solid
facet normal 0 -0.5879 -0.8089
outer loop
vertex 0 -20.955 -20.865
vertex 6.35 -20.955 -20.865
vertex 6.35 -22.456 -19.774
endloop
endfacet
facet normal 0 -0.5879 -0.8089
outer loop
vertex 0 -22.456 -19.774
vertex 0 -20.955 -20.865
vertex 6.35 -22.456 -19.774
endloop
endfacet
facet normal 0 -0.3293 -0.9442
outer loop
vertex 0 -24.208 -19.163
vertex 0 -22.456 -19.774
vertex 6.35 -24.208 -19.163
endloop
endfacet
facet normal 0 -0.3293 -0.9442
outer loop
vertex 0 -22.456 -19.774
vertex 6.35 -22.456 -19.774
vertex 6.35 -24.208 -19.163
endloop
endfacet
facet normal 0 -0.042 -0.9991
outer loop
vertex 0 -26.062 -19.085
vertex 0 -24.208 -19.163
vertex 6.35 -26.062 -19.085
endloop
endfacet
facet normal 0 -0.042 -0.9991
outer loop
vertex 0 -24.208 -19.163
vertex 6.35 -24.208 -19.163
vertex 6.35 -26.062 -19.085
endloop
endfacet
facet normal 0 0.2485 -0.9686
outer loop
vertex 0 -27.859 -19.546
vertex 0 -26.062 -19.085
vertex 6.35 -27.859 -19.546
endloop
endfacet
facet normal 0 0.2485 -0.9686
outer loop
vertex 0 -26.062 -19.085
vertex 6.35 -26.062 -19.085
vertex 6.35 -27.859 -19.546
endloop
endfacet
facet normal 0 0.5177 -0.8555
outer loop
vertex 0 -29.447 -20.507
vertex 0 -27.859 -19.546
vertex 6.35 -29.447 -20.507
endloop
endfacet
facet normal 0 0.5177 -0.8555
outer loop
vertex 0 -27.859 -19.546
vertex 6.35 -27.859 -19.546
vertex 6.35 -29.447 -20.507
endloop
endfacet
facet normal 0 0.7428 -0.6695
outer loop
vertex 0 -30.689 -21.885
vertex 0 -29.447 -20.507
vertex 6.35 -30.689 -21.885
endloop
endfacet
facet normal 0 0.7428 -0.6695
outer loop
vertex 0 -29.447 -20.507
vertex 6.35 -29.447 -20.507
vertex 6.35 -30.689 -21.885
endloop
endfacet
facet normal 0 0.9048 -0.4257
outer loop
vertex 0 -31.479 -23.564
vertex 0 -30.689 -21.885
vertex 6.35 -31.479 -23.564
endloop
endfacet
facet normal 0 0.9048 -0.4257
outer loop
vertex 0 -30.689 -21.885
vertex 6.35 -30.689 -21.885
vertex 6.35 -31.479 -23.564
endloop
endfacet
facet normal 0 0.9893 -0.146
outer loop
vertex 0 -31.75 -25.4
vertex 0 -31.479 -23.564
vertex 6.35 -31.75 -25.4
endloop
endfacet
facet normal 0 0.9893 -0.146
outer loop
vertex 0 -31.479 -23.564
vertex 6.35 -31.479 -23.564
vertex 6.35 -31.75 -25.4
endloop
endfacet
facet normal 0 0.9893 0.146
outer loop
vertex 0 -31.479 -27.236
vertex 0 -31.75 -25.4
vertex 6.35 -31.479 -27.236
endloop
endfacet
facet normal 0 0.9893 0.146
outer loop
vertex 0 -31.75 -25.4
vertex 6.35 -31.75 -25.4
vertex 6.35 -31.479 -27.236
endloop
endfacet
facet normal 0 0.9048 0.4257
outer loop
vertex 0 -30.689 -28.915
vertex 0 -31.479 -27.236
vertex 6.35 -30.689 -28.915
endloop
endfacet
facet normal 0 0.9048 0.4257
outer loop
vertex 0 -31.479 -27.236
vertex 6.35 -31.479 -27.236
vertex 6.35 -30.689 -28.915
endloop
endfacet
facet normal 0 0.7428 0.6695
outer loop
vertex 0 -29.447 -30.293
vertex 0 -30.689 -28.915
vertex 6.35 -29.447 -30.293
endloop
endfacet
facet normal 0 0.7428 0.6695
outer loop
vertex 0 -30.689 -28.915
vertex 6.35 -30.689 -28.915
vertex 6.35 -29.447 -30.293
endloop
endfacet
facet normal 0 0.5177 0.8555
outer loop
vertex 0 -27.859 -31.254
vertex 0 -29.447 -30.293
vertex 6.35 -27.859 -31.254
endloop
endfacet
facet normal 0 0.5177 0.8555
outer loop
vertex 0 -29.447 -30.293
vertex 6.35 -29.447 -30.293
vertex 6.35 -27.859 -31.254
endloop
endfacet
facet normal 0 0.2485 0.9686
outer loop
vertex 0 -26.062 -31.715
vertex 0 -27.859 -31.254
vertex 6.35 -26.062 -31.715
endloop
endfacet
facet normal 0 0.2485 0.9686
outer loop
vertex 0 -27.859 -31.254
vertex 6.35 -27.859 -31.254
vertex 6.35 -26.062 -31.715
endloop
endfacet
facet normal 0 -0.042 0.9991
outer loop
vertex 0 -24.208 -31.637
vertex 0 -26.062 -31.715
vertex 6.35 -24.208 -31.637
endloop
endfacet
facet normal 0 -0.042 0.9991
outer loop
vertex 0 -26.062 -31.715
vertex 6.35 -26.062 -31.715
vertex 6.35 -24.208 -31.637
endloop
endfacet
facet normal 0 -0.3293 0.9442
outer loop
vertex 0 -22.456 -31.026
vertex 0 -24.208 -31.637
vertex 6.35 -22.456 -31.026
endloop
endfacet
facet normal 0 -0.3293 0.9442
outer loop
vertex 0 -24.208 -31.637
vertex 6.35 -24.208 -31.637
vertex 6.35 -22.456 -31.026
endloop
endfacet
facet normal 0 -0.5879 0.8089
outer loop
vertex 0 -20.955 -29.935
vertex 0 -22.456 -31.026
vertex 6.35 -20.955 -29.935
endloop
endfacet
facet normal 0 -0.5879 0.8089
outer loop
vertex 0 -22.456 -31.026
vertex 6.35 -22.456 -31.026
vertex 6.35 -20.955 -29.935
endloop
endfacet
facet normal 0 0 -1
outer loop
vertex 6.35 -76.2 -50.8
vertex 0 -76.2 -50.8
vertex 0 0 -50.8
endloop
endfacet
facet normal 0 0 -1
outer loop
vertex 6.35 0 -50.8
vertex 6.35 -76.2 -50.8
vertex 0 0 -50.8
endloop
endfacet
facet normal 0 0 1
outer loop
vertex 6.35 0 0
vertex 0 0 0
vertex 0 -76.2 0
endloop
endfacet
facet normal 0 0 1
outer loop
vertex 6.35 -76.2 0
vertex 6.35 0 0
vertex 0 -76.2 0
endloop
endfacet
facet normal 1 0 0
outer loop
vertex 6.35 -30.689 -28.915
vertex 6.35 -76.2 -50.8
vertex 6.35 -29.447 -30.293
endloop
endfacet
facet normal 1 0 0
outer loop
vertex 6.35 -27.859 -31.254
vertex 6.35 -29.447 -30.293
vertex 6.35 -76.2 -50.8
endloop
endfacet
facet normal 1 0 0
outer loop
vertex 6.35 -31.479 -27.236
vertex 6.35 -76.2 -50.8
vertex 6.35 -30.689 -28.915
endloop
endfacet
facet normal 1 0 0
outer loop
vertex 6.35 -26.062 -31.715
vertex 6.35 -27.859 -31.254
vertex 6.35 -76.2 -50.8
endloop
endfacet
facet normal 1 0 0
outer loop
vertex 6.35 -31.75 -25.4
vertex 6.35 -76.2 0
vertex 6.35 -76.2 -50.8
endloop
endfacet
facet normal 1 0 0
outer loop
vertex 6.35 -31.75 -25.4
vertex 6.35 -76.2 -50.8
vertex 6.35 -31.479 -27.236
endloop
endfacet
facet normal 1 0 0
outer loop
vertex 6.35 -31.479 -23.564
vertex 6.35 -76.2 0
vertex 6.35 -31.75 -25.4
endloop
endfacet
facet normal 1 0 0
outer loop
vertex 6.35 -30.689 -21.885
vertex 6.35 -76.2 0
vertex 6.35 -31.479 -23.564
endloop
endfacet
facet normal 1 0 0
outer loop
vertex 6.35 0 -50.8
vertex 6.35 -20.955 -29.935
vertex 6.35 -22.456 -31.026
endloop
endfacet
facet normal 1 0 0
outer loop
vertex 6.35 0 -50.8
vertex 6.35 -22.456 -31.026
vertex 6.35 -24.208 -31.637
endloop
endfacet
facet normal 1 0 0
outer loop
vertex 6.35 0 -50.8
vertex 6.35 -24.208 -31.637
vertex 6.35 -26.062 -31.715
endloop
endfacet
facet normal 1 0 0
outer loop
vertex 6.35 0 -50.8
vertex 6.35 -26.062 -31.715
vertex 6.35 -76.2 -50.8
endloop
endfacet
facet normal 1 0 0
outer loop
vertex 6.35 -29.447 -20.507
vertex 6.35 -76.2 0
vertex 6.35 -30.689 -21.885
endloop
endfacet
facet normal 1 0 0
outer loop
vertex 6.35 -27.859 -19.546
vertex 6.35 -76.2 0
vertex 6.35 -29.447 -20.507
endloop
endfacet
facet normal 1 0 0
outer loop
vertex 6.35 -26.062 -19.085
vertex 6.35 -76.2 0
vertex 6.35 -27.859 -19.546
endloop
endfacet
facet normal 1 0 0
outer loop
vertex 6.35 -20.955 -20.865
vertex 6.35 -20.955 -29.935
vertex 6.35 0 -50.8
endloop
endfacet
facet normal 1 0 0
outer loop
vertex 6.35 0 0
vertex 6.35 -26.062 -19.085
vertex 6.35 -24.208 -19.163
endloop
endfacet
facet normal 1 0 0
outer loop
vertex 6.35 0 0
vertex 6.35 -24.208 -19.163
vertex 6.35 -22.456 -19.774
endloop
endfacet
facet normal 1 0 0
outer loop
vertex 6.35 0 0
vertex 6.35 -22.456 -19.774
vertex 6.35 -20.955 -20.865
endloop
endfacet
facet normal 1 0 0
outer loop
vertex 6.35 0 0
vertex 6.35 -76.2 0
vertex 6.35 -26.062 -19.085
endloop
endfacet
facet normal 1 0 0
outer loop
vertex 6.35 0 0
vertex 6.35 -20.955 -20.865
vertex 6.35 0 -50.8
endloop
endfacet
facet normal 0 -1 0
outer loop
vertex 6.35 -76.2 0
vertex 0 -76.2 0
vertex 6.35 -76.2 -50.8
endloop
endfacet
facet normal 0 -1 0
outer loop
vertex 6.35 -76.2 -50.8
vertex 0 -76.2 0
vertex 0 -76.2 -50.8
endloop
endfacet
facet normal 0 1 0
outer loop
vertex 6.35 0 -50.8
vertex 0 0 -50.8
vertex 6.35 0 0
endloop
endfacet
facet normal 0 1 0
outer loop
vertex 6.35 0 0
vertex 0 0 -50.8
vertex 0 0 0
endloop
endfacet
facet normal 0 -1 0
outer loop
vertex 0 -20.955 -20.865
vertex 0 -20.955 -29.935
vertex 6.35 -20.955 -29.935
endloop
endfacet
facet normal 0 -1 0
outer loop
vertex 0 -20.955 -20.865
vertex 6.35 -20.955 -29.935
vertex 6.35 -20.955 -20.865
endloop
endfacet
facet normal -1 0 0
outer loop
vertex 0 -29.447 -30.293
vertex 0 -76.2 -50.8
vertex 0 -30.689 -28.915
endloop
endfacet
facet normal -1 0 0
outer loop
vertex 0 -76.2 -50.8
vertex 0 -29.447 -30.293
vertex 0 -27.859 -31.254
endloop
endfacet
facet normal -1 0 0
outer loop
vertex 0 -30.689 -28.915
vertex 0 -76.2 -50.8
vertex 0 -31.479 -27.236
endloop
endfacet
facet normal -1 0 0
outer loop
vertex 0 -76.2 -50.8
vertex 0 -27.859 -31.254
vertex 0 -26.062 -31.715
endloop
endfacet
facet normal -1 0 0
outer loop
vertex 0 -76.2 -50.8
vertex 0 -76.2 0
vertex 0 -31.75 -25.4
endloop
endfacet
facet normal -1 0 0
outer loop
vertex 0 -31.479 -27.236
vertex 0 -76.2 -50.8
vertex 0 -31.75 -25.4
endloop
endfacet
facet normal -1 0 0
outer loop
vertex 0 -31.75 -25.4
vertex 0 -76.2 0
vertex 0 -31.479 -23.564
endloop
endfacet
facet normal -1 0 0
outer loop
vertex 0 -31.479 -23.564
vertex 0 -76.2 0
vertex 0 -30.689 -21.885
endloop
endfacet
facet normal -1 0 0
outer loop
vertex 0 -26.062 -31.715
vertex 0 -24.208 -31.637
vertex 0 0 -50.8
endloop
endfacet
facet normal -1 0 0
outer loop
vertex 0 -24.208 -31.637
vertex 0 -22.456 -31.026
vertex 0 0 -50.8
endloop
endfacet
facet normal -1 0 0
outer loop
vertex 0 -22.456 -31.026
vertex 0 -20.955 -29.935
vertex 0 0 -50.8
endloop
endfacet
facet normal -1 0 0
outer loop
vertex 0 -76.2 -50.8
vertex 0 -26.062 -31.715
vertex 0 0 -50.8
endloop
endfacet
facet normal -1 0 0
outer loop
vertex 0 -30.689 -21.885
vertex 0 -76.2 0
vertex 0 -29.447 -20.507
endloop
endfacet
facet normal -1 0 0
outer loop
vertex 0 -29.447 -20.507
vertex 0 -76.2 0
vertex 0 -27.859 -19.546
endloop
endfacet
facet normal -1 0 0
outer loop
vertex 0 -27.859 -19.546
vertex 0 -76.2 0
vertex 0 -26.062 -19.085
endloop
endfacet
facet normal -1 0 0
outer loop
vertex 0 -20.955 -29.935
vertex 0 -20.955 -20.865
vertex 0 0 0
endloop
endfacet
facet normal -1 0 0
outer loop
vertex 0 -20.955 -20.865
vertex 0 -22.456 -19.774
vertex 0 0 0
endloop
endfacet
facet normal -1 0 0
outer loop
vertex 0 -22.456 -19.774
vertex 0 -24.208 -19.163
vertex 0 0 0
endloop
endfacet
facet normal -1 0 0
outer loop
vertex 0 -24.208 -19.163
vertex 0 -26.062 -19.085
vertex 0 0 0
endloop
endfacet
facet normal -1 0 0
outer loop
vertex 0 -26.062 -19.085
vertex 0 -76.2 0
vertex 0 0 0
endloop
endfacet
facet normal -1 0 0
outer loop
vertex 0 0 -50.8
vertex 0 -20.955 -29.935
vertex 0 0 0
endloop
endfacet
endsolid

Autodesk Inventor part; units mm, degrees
ref_plane "YZ Plane" through (0, 0, 0) normal (1, 0, 0) x (0, 1, 0)
ref_plane "XZ Plane" through (0, 0, 0) normal (0, 1, 0) x (-1, 0, 0)
ref_plane "XY Plane" through (0, 0, 0) normal (0, 0, 1) x (1, 0, 0)
sketch "Sketch1" plane through (0, 0, 0) normal (1, 0, 0) x (0, 1, 0)
  line L0 (0, 0) -> (-76.2, 0)
  line L1 (-76.2, 0) -> (-76.2, -50.8)
  line L2 (-76.2, -50.8) -> (0, -50.8)
  line L3 (0, -50.8) -> (0, 0)
  dimension "d0" = 76.2
  dimension "d1" = 50.8
extrude "Extrusion1" add sketch "Sketch1" along normal blind 6.35
sketch "Sketch2" plane through (0, 0, 0) normal (-1, 0, 0) x (0, 0, 1)
  line L0 (-50.8, -76.2) -> (-50.8, 0) projected
  line L1 (0, 0) -> (0, -76.2) projected
  line L2 (-50.8, 0) -> (0, 0) projected
  point P0 (-25.4, -25.4)
  dimension "d4" = 50.8
  dimension "d5" = 25.4
  dimension "d6" = 25.4
hole "Hole1" at (0, -25.4, -25.4) direction (1, 0, 0) diameter 12.7 depth 25.4 tip angle 118
sketch "Sketch3" plane through (0, 0, 0) normal (-1, 0, 0) x (0, 0, 1)
  circle A0 centre (-25.4, -25.4) radius 6.35 projected
  line L0 (0, 0) -> (0, -76.2) projected
  line L1 (-50.8, 0) -> (0, 0) projected
  line L2 (-50.8, -76.2) -> (-50.8, 0) projected
  line L3 (0, -76.2) -> (-50.8, -76.2) projected
  circle A1 centre (-25.4, -25.4) radius 6.35 projected
  line L4 (-29.9348, -20.955) -> (-20.8652, -20.955)
  line L5 (-50.8, 0) -> (0, 0) projected
  dimension "d14" = 4.445
extrude "Extrusion2" add sketch "Sketch3" against normal blind 6.35 contours L4 A0 picked at (-25.16, -20.3336)
equation "\"d5\" = 0.5 * d4"
equation "\"d6\" = d5"
properties part number "StressTestPlate"
